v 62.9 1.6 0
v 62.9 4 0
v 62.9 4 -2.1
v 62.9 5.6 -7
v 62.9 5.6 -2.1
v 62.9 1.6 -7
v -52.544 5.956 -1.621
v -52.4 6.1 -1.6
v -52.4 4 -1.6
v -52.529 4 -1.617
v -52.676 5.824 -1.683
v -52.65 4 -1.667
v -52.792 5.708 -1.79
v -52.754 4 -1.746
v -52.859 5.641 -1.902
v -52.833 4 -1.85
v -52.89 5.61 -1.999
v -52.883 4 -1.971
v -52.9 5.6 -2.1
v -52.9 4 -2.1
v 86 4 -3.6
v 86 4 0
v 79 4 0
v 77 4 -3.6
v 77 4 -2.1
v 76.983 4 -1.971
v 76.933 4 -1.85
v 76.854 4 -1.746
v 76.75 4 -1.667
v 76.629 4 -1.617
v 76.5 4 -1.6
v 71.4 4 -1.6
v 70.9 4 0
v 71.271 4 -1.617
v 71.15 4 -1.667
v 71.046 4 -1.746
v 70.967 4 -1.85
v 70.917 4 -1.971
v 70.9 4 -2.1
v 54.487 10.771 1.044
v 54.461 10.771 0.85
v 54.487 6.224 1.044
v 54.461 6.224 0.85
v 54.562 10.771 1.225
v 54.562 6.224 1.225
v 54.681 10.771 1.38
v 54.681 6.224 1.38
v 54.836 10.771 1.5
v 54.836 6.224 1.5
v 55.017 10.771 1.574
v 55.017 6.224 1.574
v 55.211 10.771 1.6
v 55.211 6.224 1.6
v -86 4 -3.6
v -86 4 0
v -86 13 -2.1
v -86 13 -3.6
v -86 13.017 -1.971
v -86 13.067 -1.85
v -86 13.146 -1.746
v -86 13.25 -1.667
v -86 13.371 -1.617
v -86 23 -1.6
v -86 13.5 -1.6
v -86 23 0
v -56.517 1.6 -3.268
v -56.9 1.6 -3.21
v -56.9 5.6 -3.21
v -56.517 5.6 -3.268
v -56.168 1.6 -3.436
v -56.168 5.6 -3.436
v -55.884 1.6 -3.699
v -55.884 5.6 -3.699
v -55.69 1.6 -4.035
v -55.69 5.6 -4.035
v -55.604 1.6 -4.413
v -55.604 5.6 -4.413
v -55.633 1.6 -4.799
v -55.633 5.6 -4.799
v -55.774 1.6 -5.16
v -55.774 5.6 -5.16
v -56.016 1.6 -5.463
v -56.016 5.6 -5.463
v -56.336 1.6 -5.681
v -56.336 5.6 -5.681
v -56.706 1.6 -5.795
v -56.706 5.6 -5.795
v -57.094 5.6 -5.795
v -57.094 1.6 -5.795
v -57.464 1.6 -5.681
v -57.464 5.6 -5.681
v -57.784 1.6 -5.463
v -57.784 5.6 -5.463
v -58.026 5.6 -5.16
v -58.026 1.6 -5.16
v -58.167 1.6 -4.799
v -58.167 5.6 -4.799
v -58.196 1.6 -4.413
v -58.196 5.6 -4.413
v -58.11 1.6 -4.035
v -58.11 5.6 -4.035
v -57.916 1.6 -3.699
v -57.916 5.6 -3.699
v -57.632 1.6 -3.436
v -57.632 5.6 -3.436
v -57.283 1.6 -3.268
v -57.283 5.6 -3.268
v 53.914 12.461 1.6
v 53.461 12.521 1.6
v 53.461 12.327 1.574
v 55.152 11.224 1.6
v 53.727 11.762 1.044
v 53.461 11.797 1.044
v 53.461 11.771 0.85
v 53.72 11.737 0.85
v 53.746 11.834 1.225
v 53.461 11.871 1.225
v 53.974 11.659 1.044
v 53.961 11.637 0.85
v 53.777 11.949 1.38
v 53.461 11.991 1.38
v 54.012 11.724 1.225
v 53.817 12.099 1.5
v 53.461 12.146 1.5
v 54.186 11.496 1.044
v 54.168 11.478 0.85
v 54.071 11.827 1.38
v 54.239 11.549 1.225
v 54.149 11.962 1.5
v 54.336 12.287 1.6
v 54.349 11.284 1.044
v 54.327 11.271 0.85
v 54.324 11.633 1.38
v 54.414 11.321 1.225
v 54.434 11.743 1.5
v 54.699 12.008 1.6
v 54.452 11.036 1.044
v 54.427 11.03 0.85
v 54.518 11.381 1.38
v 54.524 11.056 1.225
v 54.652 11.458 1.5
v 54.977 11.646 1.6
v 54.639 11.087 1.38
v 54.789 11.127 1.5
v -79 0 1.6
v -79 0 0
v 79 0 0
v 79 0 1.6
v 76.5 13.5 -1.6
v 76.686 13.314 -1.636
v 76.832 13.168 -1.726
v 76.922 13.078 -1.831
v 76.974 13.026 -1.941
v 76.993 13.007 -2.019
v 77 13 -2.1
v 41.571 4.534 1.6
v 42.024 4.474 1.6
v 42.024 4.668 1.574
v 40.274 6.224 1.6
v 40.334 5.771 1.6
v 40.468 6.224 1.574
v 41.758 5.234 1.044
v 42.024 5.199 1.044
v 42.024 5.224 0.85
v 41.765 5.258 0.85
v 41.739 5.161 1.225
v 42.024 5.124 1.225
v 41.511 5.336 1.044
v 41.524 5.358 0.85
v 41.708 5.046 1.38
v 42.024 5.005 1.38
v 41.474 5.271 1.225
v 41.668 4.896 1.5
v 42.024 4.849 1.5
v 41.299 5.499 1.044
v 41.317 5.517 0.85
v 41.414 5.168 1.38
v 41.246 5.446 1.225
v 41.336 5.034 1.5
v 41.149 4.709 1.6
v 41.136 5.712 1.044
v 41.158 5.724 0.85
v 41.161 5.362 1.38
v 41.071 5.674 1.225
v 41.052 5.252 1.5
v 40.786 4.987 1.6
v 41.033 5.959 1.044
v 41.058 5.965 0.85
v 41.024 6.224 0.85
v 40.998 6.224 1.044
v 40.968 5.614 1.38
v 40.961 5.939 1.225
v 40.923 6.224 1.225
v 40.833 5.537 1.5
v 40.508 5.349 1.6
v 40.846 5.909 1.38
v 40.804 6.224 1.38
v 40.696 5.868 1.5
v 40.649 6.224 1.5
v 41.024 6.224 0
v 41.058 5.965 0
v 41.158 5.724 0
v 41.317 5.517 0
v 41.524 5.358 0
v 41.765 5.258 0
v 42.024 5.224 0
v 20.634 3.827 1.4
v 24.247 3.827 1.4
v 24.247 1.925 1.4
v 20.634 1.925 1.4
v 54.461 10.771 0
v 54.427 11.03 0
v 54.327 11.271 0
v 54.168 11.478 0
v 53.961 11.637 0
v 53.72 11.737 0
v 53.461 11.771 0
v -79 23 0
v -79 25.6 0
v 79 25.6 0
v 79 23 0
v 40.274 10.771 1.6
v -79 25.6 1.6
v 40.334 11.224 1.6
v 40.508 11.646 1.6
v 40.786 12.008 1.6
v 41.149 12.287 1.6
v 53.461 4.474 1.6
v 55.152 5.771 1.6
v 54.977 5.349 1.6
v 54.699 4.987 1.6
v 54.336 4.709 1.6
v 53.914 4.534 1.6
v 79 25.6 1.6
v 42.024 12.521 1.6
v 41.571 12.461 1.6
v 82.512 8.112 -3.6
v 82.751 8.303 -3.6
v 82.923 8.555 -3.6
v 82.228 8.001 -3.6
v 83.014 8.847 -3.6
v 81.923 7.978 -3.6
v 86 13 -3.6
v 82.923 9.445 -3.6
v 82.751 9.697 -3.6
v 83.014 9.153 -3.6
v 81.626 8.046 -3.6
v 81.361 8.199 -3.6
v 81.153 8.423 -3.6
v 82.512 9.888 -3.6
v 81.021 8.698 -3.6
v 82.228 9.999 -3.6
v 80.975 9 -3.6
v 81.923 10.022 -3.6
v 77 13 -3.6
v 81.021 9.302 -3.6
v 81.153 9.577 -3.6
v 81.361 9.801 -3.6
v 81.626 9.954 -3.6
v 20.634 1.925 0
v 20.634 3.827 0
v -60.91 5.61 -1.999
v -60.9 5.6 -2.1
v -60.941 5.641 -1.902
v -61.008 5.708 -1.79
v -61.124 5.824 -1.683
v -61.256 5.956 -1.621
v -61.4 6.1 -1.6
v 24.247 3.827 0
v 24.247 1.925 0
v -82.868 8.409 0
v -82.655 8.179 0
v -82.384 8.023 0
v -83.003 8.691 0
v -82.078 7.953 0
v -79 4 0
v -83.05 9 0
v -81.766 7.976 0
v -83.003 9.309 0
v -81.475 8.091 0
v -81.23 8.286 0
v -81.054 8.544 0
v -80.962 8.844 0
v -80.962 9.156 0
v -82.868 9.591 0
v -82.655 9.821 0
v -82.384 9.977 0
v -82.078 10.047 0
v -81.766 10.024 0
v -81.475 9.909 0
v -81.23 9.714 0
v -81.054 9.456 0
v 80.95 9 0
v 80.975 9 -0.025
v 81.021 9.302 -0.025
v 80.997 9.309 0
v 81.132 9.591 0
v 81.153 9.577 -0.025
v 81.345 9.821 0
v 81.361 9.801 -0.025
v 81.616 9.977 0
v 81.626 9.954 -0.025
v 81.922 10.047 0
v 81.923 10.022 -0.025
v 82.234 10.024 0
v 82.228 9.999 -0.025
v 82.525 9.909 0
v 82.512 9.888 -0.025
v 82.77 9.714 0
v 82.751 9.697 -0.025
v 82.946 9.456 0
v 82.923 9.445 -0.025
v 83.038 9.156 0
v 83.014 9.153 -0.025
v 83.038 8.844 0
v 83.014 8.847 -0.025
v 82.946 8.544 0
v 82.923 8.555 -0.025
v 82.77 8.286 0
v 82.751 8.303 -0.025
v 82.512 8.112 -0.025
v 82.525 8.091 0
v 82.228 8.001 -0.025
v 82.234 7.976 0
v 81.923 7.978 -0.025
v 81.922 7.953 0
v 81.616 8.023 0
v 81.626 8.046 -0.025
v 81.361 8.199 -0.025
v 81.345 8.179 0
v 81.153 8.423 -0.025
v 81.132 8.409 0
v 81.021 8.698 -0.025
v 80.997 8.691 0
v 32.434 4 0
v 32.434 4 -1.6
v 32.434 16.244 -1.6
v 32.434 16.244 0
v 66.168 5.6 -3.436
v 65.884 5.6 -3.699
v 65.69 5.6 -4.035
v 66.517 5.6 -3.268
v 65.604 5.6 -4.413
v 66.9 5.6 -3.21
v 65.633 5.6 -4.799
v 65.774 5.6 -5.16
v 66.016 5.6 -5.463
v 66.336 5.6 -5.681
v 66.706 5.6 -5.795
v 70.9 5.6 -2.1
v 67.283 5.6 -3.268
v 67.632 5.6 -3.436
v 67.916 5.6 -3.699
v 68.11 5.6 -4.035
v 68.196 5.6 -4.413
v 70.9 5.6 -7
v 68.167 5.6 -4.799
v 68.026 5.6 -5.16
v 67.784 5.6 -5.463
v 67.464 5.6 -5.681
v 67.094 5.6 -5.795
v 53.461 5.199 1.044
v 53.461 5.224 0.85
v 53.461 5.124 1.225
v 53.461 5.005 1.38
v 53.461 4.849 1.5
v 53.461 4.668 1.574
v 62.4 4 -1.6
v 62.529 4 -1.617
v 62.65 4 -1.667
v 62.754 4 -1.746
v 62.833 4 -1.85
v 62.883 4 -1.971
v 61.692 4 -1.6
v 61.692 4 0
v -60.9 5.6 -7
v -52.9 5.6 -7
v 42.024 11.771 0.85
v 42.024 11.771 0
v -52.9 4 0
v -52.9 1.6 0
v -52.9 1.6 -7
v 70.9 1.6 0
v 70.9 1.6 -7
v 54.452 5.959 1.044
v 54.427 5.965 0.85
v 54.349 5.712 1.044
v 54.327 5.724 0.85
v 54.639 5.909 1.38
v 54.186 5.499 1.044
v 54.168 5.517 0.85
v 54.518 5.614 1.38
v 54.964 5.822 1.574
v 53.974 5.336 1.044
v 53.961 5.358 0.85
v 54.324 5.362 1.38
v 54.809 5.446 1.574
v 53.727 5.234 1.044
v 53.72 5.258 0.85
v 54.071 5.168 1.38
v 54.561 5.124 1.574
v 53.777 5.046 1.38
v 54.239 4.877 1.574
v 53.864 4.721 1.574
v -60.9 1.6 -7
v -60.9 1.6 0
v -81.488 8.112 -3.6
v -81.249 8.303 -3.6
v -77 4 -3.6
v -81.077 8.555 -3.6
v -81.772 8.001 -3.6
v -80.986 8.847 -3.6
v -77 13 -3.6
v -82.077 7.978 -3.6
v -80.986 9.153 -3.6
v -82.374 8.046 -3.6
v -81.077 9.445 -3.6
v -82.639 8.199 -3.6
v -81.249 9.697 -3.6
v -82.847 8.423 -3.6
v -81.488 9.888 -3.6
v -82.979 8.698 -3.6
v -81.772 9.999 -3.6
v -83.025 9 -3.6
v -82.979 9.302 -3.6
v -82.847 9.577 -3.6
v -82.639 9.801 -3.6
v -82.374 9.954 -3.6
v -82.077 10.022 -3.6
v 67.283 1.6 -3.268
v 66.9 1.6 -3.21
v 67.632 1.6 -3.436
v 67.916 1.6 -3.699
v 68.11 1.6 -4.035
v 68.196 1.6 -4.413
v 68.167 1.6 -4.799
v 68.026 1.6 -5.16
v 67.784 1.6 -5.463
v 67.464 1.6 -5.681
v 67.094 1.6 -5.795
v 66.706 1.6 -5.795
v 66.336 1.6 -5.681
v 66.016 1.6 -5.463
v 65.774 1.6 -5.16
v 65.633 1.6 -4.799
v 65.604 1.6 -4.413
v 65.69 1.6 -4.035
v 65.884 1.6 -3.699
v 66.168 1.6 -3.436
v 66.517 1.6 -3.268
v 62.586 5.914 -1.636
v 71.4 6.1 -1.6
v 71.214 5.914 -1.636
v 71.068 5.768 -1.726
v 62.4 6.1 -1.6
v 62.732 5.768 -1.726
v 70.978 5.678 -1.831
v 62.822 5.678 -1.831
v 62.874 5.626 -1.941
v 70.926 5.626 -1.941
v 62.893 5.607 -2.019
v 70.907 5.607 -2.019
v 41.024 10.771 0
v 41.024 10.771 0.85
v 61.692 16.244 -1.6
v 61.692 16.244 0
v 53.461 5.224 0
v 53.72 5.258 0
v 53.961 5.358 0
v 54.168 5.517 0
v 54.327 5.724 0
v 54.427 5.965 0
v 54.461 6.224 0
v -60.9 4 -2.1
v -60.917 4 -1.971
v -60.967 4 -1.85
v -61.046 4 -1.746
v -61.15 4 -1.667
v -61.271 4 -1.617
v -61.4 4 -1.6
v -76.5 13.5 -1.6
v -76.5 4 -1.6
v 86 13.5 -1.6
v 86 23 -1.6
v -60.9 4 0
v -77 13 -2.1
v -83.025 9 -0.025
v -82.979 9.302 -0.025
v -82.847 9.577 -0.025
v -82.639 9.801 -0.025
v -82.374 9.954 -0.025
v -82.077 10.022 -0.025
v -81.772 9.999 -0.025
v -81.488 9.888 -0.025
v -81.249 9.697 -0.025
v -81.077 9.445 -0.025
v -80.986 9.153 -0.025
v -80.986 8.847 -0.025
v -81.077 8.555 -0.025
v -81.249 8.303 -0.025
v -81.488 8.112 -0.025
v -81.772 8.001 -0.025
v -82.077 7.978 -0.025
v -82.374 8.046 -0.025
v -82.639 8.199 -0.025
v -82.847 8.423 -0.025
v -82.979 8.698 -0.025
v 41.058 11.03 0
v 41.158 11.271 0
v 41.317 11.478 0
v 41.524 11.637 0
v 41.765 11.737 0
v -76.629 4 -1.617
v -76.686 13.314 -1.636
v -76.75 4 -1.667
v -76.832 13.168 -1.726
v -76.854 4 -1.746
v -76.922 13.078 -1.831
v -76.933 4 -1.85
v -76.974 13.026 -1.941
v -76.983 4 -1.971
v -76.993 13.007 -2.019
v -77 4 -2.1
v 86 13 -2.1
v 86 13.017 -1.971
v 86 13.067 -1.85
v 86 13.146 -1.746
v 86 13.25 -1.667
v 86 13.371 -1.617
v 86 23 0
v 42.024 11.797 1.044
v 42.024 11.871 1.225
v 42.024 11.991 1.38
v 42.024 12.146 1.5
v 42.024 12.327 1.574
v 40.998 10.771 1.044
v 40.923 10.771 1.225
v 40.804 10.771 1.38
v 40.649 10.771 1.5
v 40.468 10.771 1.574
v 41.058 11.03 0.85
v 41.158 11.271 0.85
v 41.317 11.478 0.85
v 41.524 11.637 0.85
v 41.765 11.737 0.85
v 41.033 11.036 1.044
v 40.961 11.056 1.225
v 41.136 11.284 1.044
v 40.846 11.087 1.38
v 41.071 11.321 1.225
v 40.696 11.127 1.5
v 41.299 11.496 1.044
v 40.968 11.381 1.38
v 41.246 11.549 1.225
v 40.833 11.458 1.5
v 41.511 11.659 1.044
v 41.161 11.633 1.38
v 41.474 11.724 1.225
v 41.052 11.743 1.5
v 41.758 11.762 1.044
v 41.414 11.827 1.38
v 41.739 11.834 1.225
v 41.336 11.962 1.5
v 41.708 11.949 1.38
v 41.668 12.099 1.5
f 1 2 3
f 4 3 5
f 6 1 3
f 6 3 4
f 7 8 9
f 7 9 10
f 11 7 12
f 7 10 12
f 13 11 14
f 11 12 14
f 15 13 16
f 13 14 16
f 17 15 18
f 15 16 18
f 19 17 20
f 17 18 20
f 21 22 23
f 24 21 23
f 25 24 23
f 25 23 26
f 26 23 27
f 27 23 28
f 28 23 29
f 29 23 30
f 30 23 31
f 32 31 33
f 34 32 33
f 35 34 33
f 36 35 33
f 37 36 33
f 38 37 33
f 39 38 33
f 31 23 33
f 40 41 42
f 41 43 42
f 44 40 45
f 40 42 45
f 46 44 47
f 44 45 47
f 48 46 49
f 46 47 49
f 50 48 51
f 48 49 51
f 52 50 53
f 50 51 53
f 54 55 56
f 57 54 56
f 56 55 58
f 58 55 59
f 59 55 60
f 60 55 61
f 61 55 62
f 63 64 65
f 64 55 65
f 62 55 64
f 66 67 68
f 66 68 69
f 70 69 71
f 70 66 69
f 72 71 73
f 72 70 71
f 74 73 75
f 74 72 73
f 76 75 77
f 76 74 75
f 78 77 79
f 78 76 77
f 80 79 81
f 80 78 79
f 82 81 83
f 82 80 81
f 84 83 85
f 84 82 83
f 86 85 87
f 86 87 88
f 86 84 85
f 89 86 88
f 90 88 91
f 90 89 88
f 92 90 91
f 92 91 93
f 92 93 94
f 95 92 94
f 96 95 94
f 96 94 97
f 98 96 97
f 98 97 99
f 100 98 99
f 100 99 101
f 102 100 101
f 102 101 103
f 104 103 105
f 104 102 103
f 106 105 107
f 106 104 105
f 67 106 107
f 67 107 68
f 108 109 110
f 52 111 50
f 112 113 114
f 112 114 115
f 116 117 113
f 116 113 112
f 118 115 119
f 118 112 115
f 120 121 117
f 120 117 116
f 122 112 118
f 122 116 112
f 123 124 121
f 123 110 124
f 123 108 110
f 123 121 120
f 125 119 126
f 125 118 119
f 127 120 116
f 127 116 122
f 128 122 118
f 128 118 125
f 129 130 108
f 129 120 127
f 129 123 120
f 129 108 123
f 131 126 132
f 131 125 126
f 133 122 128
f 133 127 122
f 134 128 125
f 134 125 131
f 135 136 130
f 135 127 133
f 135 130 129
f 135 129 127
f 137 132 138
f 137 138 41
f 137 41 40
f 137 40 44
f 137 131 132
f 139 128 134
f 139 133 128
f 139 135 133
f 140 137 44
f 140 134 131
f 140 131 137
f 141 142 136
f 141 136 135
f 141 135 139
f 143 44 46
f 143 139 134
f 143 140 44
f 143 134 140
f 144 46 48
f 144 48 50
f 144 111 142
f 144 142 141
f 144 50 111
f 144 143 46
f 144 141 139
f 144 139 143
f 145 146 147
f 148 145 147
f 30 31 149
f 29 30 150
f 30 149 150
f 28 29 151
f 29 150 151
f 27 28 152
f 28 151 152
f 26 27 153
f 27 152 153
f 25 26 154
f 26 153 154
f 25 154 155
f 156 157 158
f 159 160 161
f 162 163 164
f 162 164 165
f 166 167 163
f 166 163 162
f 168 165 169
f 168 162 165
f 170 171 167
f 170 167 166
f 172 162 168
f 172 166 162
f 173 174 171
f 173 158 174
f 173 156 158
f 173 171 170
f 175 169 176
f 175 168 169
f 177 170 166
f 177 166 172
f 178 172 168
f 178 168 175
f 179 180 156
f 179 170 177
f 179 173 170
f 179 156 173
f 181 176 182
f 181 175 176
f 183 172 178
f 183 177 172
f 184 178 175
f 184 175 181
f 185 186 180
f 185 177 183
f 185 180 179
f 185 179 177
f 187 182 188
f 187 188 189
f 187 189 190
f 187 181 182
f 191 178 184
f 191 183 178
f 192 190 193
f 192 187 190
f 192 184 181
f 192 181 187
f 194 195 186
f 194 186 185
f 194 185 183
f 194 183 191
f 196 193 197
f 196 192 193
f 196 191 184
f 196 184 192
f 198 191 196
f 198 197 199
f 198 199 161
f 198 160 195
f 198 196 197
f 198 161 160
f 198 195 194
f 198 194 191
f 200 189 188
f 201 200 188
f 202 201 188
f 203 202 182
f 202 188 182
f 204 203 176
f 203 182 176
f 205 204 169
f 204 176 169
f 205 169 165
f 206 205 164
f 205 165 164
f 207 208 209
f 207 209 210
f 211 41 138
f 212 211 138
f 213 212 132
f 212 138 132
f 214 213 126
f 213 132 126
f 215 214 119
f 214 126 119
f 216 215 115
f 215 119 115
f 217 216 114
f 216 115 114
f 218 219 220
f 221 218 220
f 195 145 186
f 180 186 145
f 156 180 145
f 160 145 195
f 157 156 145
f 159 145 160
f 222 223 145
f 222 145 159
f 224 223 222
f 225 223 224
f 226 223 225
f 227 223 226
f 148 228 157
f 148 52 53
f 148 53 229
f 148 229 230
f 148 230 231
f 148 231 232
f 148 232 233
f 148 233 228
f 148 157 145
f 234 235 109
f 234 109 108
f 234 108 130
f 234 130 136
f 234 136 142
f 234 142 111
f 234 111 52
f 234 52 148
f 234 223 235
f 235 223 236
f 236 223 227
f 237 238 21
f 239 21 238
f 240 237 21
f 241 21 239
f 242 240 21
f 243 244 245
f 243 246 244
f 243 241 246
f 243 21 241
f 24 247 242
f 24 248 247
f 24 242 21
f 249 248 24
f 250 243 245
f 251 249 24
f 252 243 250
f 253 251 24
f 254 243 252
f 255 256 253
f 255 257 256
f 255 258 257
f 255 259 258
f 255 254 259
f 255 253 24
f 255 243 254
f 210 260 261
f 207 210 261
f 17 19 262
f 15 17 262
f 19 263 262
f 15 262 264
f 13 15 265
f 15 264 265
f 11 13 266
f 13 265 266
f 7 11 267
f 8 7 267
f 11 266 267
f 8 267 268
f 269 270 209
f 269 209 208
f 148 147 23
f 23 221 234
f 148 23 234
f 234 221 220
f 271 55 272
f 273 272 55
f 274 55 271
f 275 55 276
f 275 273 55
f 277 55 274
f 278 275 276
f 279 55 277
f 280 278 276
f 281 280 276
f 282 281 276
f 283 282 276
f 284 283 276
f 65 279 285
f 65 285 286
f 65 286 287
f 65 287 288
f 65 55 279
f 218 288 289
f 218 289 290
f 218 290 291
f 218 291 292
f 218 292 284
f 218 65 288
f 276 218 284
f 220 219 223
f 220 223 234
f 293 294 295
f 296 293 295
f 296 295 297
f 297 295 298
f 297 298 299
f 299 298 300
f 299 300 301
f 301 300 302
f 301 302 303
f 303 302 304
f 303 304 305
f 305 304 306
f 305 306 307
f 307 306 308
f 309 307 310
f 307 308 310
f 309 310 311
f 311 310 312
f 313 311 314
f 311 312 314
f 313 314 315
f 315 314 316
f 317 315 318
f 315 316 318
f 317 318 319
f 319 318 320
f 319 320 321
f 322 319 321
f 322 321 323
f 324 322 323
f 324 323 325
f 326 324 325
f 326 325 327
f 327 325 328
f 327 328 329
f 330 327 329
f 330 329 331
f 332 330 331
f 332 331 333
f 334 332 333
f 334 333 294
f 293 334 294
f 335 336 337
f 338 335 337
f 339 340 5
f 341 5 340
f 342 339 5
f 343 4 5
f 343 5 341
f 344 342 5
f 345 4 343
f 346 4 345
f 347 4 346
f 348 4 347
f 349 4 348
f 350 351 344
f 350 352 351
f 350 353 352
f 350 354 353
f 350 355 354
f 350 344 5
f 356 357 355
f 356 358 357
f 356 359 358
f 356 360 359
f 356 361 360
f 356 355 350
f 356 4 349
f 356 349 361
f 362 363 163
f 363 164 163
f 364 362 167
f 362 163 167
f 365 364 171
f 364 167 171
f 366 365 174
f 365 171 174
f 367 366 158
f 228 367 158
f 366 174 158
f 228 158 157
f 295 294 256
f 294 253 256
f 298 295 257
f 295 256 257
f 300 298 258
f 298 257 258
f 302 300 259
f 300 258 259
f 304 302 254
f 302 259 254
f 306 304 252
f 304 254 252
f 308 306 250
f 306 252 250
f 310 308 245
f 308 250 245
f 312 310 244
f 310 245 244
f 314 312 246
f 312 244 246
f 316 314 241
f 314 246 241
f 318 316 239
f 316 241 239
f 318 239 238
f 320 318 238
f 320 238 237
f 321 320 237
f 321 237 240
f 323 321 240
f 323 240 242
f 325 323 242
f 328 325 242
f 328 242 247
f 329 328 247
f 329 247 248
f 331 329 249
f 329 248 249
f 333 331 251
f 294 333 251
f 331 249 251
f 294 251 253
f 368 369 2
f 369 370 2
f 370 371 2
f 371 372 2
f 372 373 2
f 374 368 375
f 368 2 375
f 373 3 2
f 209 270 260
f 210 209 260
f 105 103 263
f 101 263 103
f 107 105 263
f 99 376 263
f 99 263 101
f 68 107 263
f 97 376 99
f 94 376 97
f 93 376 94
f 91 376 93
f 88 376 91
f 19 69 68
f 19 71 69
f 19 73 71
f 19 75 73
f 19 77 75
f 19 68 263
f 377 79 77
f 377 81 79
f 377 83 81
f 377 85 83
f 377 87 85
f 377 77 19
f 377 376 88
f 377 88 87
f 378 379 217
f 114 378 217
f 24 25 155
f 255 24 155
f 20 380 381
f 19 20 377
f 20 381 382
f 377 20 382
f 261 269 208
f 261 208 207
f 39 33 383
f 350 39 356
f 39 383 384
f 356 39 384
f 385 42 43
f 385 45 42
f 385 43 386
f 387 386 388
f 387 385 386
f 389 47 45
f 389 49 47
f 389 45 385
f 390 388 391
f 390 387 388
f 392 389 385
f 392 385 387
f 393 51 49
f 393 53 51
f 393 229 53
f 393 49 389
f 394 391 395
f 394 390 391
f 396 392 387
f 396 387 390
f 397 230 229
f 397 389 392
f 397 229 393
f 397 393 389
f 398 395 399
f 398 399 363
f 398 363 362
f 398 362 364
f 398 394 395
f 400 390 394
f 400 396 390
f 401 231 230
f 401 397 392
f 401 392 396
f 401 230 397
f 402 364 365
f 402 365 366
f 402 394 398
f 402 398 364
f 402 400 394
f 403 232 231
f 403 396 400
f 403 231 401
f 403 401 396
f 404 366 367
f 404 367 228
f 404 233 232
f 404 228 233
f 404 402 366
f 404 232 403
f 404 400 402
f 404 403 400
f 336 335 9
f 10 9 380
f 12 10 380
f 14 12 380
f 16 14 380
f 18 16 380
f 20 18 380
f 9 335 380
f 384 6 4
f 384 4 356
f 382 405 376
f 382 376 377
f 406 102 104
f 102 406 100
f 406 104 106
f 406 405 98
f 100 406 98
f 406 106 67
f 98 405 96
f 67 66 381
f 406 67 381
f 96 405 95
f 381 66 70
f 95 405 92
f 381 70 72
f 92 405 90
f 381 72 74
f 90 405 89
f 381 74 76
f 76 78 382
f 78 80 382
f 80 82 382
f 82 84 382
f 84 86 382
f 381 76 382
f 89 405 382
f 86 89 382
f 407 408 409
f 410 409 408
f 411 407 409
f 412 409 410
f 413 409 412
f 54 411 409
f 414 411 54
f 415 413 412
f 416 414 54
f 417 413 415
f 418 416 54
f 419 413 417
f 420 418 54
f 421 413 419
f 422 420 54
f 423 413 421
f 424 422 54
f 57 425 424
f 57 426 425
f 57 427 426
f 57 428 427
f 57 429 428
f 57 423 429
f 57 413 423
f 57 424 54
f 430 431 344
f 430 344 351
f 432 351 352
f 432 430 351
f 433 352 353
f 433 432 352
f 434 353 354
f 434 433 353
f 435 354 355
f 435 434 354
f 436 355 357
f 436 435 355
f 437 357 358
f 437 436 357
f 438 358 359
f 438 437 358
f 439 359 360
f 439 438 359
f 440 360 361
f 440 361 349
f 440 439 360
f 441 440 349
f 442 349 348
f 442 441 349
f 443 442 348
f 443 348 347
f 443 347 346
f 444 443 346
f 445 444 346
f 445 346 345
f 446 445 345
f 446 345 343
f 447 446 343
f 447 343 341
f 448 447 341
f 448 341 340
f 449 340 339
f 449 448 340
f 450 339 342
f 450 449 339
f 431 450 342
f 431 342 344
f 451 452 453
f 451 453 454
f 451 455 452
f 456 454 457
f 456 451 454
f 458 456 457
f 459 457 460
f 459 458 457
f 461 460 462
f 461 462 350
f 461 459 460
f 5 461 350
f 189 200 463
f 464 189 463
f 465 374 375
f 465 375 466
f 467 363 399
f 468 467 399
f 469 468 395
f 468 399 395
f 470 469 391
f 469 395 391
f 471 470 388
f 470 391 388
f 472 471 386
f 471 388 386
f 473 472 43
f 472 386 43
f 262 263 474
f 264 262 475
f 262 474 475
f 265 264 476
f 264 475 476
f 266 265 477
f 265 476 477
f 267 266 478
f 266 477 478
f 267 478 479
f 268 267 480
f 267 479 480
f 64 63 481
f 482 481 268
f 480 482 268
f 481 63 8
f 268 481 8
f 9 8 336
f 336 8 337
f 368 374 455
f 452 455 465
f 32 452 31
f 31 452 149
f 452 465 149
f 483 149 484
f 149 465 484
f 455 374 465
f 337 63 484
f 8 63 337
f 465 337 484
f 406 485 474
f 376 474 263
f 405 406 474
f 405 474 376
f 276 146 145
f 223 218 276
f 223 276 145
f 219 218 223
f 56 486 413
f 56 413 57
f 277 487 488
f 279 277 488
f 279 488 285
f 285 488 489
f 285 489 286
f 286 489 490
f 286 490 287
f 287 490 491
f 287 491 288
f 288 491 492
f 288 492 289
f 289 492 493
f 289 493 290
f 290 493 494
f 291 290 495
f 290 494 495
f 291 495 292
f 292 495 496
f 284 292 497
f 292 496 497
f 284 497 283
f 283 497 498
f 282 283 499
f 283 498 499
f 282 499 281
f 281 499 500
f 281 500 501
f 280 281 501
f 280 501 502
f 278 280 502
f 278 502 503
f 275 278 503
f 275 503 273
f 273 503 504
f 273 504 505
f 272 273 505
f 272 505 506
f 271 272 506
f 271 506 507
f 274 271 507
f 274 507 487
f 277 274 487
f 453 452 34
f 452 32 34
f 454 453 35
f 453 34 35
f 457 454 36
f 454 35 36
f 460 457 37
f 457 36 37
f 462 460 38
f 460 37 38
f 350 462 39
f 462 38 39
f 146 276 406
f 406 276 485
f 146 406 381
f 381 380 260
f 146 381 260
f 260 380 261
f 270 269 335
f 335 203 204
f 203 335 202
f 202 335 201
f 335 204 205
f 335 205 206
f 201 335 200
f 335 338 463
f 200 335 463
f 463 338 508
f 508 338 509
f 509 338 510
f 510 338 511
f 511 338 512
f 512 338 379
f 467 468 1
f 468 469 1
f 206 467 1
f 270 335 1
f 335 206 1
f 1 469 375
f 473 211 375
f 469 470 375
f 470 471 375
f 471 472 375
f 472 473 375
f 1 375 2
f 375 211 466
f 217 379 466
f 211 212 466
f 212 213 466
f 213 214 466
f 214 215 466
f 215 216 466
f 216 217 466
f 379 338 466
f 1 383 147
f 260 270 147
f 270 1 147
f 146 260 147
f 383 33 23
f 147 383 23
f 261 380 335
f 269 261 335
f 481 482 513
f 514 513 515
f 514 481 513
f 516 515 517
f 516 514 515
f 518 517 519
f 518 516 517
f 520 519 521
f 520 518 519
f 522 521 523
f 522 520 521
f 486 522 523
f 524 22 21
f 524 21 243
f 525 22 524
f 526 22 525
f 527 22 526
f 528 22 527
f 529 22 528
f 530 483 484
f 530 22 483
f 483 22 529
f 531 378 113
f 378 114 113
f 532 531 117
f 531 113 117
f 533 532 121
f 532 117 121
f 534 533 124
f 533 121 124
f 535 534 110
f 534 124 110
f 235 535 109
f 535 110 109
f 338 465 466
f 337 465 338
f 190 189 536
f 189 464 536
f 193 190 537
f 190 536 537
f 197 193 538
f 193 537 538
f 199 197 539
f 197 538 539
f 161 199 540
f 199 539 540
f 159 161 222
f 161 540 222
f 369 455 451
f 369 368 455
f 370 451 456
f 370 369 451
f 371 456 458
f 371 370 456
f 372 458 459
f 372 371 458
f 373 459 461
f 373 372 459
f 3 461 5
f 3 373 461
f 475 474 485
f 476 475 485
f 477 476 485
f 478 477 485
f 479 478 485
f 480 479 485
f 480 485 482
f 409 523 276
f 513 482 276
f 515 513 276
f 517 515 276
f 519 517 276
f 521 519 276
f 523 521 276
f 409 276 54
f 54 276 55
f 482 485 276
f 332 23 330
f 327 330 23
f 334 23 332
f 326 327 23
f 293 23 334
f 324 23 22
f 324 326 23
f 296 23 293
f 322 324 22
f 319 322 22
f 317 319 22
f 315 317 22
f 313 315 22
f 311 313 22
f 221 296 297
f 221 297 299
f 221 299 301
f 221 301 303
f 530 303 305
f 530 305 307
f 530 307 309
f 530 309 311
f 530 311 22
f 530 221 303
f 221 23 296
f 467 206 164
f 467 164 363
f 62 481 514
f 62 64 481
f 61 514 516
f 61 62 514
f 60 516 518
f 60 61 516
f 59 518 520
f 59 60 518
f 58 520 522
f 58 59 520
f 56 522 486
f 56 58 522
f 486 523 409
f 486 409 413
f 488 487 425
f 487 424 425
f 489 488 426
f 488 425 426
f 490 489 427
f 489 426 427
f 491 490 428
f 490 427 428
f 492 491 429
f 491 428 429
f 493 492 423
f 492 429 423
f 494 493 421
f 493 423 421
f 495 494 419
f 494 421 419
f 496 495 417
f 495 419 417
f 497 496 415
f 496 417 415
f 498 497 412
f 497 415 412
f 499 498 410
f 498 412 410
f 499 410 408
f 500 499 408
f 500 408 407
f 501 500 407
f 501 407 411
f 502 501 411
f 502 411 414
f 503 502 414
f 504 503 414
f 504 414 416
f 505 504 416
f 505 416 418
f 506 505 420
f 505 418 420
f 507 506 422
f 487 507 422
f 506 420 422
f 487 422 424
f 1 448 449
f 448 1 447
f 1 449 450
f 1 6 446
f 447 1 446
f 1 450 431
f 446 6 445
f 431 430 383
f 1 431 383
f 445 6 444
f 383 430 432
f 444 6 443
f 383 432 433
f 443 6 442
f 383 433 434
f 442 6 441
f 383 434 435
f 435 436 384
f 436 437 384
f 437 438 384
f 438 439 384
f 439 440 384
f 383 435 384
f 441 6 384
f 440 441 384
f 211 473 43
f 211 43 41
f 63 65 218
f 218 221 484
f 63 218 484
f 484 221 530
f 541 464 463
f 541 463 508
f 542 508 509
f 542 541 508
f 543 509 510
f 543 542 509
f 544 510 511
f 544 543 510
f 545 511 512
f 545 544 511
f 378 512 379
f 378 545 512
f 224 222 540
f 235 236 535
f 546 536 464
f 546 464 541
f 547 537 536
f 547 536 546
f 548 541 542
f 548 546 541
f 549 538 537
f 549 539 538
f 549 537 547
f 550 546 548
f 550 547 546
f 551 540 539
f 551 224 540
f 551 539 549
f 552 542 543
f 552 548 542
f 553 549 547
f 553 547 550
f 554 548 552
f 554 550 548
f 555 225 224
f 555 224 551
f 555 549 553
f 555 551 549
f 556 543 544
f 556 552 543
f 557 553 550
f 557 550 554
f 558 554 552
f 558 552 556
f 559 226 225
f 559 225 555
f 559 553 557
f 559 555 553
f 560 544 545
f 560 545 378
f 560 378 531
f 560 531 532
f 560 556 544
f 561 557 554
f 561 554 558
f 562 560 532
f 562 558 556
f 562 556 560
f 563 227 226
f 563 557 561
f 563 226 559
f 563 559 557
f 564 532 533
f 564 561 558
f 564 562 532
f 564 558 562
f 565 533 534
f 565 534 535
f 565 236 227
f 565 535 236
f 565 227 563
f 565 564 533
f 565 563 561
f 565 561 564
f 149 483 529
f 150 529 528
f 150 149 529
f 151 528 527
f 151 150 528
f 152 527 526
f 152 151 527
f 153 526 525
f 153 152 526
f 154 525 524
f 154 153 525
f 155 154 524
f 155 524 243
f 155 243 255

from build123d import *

# Parameters (mm, degrees)
SKETCH1_W                                = 158
SKETCH1_H                                = 25.6
PRIMARY_BACKPLATE_DEPTH                  = 1.6
SKETCH2_W                                = 172
SKETCH2_H                                = 19
PLATE_THICKENER_DEPTH                    = 1.6
SKETCH13_W                               = 9
SKETCH13_H                               = 9
THICKER_REAR_BOLT_BLOCKS_DEPTH           = 2
TAP_DRILL_FOR_M2_5X0_45_TAP3_D           = 2.05
TAP_DRILL_FOR_M2_5X0_45_TAP3_CSINK_D     = 2.1
TAP_DRILL_FOR_M2_5X0_45_TAP3_CSINK_ANGLE = 90
SKETCH7_W                                = 8
SKETCH7_H                                = 7
SKETCH7_R                                = 1.3
MOUNTING_BOSSES_DEPTH                    = 4
MOUNTING_BOSSES_2_DEPTH                  = 4
USB_HOLE_DEPTH                           = 91.001999978
USB_HOLE_DEPTH_BACK                      = 91.001999978
SKETCH8_W                                = 13.43739998
SKETCH8_H                                = 6.546680298
FILLET1_R                                = 0.5
SKETCH9_W                                = 29.257163278
SKETCH9_H                                = 15.778717932
MODULE_RELIEF_DEPTH                      = 1.6
FILLET2_R                                = 1
FILLET3_R                                = 0.75
SKETCH12_W                               = 3.613166431
SKETCH12_H                               = 1.901681258
LED_HOLE_DEPTH                           = 3


with BuildPart() as part:
    # Sketch1 → Primary backplate (new body)
    with BuildSketch(Plane.XY):
        with Locations((0, 12.8)):
            Rectangle(SKETCH1_W, SKETCH1_H)
    extrude(amount=PRIMARY_BACKPLATE_DEPTH)

    # Sketch2 → Plate thickener (add)
    with BuildSketch(Plane.XY):
        with Locations((0, 13.5)):
            Rectangle(SKETCH2_W, SKETCH2_H)
    extrude(amount=-PLATE_THICKENER_DEPTH)

    # Sketch13 → Thicker rear bolt blocks (add)
    with BuildSketch(Plane(origin=(0, 0, -1.6), x_dir=(-1, 0, 0), z_dir=(0, 0, -1))):
        with Locations((-81.5, 8.5)):
            Rectangle(SKETCH13_W, SKETCH13_H)
        with Locations((81.5, 8.5)):
            Rectangle(SKETCH13_W, SKETCH13_H)
    extrude(amount=THICKER_REAR_BOLT_BLOCKS_DEPTH)

    # Tap Drill for M2.5x0.45 Tap3 (through all)
    with Locations(Plane(origin=(-82, 9, 0), x_dir=(1, 0, 0), z_dir=(0, 0, 1))):
        with Locations((0, 0), (164, 0)):
            CounterSinkHole(TAP_DRILL_FOR_M2_5X0_45_TAP3_D / 2, TAP_DRILL_FOR_M2_5X0_45_TAP3_CSINK_D / 2, counter_sink_angle=TAP_DRILL_FOR_M2_5X0_45_TAP3_CSINK_ANGLE)

    # Sketch8 → USB hole (cut, two sides: drawn at the far end of the back side and taken through both)
    with BuildSketch(Plane.XY.offset(-USB_HOLE_DEPTH_BACK)):
        with Locations((47.742572722, 8.497650706)):
            Rectangle(SKETCH8_W, SKETCH8_H)
    extrude(amount=USB_HOLE_DEPTH + USB_HOLE_DEPTH_BACK, mode=Mode.SUBTRACT)


with BuildPart() as body_2:
    # Sketch7 → Mounting bosses (new body)
    with BuildSketch(Plane(origin=(0, 1.6, 0), x_dir=(1, 0, 0), z_dir=(0, 1, 0))):
        with Locations((-56.9, 3.5)):
            Rectangle(SKETCH7_W, SKETCH7_H)
        with Locations(Location((-56.9, 4.51, 0), (0, 0, 270))):
            Circle(SKETCH7_R, mode=Mode.SUBTRACT)
    extrude(amount=MOUNTING_BOSSES_DEPTH)


with BuildPart() as body_3:
    # Sketch7 → Mounting bosses 2 (new body)
    with BuildSketch(Plane(origin=(0, 1.6, 0), x_dir=(1, 0, 0), z_dir=(0, 1, 0))):
        with Locations((66.9, 3.5)):
            Rectangle(SKETCH7_W, SKETCH7_H)
        with Locations(Location((66.9, 4.51, 0), (0, 0, 270))):
            Circle(SKETCH7_R, mode=Mode.SUBTRACT)
    extrude(amount=MOUNTING_BOSSES_2_DEPTH)


with BuildPart() as part_1:
    add(part.part)

    # Combine1: union body 3, body 2
    add(body_3.part)
    add(body_2.part)

    # Fillet1
    fillet1_edges = [part_1.edges().sort_by_distance(p)[0] for p in [
        (-56.9, 5.6, -1.6),
        (66.9, 5.6, -1.6),
        (70.9, 4.8, -1.6),
        (62.9, 4.8, -1.6),
        (-60.9, 4.8, -1.6),
        (-52.9, 4.8, -1.6),
        (77, 8.5, -1.6),
        (81.5, 13, -1.6),
        (-81.5, 13, -1.6),
        (-77, 8.5, -1.6),
    ]]
    fillet(fillet1_edges, radius=FILLET1_R)

    # Sketch9 → module relief (cut)
    with BuildSketch(Plane(origin=(0, 0, -1.6), x_dir=(-1, 0, 0), z_dir=(0, 0, -1))):
        with Locations((-47.06304244, 8.354907592)):
            Rectangle(SKETCH9_W, SKETCH9_H)
    extrude(amount=-MODULE_RELIEF_DEPTH, mode=Mode.SUBTRACT)

    # Fillet2
    fillet2_edges = [part_1.edges().sort_by_distance(p)[0] for p in [
        (54.461272712, 11.770990855, 0.8),
        (41.023872732, 11.770990855, 0.8),
        (41.023872732, 5.224310557, 0.8),
        (54.461272712, 5.224310557, 0.8),
    ]]
    fillet(fillet2_edges, radius=FILLET2_R)

    # Fillet3
    fillet3_edges = [part_1.edges().sort_by_distance(p)[0] for p in [
        (47.742572722, 5.224310557, 1.6),
        (41.023872732, 8.497650706, 1.6),
        (54.461272712, 8.497650706, 1.6),
        (47.742572722, 11.770990855, 1.6),
        (41.31676595, 5.517203775, 1.6),
        (54.168379493, 5.517203775, 1.6),
        (54.168379493, 11.478097636, 1.6),
        (41.31676595, 11.478097636, 1.6),
    ]]
    fillet(fillet3_edges, radius=FILLET3_R)

    # Sketch12 → LED hole (cut)
    with BuildSketch(Plane(origin=(0, 0, -1.6), x_dir=(-1, 0, 0), z_dir=(0, 0, -1))):
        with Locations((-22.440360865, 2.876256908)):
            Rectangle(SKETCH12_W, SKETCH12_H)
    extrude(amount=-LED_HOLE_DEPTH, mode=Mode.SUBTRACT)


solid = part_1.part
